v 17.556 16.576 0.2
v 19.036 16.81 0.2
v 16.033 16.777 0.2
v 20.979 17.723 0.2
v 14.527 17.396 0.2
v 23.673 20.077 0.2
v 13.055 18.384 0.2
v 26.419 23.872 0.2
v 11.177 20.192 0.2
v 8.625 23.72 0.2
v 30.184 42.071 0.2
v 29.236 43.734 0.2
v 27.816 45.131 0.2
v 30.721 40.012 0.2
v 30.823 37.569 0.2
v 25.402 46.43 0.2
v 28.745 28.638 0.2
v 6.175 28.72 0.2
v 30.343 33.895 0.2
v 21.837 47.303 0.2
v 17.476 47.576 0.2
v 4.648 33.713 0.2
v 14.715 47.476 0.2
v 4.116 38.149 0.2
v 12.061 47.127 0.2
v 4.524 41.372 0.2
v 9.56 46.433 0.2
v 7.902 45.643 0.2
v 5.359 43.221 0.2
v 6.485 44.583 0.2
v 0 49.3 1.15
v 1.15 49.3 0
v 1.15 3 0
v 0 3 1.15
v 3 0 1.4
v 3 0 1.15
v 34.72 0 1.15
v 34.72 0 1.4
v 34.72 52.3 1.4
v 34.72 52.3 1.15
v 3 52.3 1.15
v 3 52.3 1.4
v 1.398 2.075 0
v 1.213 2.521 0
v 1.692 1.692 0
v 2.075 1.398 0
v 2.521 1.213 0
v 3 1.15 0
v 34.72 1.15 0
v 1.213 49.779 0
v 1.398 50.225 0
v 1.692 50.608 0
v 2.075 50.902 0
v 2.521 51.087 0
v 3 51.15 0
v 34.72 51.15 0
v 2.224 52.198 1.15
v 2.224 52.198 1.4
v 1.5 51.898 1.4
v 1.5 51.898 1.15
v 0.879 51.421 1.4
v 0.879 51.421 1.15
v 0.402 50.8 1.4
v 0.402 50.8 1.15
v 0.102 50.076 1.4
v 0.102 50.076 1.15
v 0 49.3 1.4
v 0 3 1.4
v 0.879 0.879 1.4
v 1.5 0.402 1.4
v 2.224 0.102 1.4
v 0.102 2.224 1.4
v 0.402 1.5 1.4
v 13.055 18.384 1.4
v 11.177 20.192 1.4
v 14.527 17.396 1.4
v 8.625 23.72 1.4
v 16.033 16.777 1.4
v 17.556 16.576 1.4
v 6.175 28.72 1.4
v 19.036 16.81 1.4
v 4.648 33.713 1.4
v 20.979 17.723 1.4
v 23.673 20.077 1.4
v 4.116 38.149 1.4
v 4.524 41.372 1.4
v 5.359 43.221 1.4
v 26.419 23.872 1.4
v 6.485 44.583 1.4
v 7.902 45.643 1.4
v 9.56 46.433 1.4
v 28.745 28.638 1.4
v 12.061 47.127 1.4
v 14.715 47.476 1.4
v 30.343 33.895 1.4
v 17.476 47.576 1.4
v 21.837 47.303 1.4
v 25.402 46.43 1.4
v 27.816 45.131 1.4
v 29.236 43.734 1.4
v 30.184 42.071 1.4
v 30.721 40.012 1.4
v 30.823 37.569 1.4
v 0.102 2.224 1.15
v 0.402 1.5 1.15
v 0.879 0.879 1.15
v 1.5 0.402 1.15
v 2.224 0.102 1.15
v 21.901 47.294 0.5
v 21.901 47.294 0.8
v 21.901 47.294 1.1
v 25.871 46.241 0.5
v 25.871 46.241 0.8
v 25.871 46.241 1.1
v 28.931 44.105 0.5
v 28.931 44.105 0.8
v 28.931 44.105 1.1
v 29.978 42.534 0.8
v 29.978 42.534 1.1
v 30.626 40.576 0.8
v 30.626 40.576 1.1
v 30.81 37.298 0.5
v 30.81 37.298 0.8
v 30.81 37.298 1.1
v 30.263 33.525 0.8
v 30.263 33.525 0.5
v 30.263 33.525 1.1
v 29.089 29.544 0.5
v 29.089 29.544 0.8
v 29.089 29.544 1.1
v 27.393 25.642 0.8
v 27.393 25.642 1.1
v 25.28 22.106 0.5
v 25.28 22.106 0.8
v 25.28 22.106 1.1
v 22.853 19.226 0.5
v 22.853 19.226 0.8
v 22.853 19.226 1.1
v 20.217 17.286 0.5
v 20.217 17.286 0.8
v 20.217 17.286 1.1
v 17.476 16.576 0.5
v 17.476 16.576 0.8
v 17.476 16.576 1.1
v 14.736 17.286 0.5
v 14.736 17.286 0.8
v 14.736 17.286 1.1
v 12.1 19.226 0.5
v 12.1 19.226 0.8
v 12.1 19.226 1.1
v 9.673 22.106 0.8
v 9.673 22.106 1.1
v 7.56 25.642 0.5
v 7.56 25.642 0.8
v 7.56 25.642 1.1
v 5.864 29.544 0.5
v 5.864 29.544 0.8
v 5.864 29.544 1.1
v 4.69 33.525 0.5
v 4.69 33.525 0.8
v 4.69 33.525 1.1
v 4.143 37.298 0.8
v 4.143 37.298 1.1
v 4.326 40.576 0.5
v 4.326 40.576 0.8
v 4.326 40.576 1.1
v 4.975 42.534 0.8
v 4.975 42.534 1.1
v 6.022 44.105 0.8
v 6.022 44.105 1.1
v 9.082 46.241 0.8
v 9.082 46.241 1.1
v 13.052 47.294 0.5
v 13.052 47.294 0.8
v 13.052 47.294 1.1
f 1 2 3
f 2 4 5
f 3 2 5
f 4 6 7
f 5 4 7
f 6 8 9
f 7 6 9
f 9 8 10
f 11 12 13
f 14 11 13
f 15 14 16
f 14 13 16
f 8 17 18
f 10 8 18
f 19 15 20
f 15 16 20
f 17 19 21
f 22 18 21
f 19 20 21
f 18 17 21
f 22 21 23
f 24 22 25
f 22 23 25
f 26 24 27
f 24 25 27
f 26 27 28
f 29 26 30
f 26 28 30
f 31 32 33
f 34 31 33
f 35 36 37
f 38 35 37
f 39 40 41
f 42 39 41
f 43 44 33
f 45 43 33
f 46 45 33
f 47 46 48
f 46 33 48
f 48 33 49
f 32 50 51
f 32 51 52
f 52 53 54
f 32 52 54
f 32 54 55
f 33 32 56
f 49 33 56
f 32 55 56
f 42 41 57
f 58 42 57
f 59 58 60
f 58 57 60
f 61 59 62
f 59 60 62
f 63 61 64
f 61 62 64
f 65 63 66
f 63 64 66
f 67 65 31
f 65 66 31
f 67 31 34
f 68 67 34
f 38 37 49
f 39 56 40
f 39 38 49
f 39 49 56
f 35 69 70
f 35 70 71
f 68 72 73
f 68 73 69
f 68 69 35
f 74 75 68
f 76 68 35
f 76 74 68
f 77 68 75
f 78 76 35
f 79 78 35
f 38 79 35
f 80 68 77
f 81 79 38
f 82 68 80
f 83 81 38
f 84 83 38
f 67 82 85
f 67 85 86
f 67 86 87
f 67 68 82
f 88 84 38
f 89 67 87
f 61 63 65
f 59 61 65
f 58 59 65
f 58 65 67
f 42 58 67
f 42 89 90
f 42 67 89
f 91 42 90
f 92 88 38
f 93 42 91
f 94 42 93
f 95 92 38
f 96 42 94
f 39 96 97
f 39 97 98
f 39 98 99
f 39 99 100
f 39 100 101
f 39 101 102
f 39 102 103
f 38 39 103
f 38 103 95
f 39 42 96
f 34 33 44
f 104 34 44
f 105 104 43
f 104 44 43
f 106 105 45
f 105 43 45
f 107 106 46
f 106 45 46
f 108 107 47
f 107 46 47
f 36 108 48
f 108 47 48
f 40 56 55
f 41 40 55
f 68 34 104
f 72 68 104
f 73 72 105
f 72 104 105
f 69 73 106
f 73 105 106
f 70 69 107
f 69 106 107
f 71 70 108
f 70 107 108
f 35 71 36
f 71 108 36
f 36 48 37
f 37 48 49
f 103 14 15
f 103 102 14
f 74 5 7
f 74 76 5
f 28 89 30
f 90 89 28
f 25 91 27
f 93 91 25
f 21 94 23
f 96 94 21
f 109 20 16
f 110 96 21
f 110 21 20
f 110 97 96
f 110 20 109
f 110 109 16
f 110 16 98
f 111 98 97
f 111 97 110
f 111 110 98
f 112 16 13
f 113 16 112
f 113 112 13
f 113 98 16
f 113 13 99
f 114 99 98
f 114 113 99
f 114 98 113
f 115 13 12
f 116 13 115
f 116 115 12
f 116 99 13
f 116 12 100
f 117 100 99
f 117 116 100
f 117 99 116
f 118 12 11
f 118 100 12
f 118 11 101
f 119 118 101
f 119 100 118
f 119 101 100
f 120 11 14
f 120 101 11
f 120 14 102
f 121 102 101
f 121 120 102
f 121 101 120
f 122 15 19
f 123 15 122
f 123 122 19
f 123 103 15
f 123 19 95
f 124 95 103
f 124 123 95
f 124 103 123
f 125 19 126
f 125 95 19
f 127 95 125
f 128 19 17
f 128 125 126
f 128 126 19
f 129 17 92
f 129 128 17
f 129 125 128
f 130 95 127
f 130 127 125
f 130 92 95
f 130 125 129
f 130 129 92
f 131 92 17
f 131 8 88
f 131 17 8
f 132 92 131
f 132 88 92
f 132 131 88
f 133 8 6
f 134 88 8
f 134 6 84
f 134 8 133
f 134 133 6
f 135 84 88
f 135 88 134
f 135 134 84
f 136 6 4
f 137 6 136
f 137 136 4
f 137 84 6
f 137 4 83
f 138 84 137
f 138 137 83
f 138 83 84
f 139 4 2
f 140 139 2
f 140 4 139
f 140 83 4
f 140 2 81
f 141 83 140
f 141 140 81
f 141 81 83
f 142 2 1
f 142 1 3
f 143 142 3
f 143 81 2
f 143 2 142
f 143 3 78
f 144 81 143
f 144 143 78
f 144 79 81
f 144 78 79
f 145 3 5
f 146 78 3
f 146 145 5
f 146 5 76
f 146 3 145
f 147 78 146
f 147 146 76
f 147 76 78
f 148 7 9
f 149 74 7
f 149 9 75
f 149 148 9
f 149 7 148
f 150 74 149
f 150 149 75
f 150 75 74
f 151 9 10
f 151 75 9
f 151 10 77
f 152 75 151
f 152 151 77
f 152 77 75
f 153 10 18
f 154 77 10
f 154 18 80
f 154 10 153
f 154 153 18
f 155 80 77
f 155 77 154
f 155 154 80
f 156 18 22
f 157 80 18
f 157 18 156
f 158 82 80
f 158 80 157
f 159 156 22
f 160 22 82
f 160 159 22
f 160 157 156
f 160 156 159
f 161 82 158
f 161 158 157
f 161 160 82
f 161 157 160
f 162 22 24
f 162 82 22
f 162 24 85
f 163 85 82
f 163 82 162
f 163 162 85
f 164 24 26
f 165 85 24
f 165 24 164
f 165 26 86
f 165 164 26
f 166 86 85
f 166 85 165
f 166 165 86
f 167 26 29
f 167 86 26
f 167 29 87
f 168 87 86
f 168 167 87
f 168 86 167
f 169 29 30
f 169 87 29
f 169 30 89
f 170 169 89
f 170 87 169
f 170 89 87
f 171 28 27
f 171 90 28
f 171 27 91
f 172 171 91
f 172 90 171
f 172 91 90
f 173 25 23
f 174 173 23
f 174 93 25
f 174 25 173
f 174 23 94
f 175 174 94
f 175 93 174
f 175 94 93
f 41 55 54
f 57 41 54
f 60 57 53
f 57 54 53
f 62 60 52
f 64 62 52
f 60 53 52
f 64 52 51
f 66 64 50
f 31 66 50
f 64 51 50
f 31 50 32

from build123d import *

# Parameters (mm, degrees)
F1_DEPTH = 1.4
F3_SIZE  = 1.15
F4_DEPTH = 1.2
F5_W     = 60.5649575591
F5_H     = 70.2168419957
F6_DEPTH = 25


with BuildPart() as f1:
    # F0 (on Top) → F1 (new body)
    with BuildSketch(Plane.XY):
        with BuildLine():
            ThreePointArc((0, 3), (0.8786796564, 0.8786796564), (3, 0))
            Line((3, 0), (81.7, 0))
            ThreePointArc((81.7, 0), (83.8213203436, 0.8786796564), (84.7, 3))
            Line((84.7, 3), (84.7, 49.3))
            ThreePointArc((84.7, 49.3), (83.8213203436, 51.4213203436), (81.7, 52.3))
            Line((81.7, 52.3), (3, 52.3))
            ThreePointArc((3, 52.3), (0.8786796564, 51.4213203436), (0, 49.3))
            Line((0, 49.3), (0, 3))
        make_face()
    extrude(amount=F1_DEPTH)

    # F3
    f3_edges = [f1.edges().sort_by_distance(p)[0] for p in [
        (42.35, 0, 0),
    ]]
    chamfer(f3_edges, length=F3_SIZE)

    # F2 (on face) → F4 (cut)
    with BuildSketch(Plane.XY.offset(1.4)):
        with BuildLine():
            add(Edge.make_bspline(
                [(17.4764175909, 47.5758282482), (23.4767717635, 47.5758282482), (37.6098450136, 44.6856723634), (17.4764175909, 0.4003325541), (-2.6570098318, 44.6856723634), (11.4760634183, 47.5758282482), (17.4764175909, 47.5758282482)],
                knots=[0, 0, 0, 0, 0.212280587, 0.5, 0.787719413, 1, 1, 1, 1], degree=3))
        make_face()
    extrude(amount=-F4_DEPTH, mode=Mode.SUBTRACT)

    # F5 (on face) → F6 (cut)
    with BuildSketch(Plane.XY.offset(1.4)):
        with Locations((65.0020055473, 21.4577354491)):
            Rectangle(F5_W, F5_H)
    extrude(amount=-F6_DEPTH, mode=Mode.SUBTRACT)


solid = f1.part
